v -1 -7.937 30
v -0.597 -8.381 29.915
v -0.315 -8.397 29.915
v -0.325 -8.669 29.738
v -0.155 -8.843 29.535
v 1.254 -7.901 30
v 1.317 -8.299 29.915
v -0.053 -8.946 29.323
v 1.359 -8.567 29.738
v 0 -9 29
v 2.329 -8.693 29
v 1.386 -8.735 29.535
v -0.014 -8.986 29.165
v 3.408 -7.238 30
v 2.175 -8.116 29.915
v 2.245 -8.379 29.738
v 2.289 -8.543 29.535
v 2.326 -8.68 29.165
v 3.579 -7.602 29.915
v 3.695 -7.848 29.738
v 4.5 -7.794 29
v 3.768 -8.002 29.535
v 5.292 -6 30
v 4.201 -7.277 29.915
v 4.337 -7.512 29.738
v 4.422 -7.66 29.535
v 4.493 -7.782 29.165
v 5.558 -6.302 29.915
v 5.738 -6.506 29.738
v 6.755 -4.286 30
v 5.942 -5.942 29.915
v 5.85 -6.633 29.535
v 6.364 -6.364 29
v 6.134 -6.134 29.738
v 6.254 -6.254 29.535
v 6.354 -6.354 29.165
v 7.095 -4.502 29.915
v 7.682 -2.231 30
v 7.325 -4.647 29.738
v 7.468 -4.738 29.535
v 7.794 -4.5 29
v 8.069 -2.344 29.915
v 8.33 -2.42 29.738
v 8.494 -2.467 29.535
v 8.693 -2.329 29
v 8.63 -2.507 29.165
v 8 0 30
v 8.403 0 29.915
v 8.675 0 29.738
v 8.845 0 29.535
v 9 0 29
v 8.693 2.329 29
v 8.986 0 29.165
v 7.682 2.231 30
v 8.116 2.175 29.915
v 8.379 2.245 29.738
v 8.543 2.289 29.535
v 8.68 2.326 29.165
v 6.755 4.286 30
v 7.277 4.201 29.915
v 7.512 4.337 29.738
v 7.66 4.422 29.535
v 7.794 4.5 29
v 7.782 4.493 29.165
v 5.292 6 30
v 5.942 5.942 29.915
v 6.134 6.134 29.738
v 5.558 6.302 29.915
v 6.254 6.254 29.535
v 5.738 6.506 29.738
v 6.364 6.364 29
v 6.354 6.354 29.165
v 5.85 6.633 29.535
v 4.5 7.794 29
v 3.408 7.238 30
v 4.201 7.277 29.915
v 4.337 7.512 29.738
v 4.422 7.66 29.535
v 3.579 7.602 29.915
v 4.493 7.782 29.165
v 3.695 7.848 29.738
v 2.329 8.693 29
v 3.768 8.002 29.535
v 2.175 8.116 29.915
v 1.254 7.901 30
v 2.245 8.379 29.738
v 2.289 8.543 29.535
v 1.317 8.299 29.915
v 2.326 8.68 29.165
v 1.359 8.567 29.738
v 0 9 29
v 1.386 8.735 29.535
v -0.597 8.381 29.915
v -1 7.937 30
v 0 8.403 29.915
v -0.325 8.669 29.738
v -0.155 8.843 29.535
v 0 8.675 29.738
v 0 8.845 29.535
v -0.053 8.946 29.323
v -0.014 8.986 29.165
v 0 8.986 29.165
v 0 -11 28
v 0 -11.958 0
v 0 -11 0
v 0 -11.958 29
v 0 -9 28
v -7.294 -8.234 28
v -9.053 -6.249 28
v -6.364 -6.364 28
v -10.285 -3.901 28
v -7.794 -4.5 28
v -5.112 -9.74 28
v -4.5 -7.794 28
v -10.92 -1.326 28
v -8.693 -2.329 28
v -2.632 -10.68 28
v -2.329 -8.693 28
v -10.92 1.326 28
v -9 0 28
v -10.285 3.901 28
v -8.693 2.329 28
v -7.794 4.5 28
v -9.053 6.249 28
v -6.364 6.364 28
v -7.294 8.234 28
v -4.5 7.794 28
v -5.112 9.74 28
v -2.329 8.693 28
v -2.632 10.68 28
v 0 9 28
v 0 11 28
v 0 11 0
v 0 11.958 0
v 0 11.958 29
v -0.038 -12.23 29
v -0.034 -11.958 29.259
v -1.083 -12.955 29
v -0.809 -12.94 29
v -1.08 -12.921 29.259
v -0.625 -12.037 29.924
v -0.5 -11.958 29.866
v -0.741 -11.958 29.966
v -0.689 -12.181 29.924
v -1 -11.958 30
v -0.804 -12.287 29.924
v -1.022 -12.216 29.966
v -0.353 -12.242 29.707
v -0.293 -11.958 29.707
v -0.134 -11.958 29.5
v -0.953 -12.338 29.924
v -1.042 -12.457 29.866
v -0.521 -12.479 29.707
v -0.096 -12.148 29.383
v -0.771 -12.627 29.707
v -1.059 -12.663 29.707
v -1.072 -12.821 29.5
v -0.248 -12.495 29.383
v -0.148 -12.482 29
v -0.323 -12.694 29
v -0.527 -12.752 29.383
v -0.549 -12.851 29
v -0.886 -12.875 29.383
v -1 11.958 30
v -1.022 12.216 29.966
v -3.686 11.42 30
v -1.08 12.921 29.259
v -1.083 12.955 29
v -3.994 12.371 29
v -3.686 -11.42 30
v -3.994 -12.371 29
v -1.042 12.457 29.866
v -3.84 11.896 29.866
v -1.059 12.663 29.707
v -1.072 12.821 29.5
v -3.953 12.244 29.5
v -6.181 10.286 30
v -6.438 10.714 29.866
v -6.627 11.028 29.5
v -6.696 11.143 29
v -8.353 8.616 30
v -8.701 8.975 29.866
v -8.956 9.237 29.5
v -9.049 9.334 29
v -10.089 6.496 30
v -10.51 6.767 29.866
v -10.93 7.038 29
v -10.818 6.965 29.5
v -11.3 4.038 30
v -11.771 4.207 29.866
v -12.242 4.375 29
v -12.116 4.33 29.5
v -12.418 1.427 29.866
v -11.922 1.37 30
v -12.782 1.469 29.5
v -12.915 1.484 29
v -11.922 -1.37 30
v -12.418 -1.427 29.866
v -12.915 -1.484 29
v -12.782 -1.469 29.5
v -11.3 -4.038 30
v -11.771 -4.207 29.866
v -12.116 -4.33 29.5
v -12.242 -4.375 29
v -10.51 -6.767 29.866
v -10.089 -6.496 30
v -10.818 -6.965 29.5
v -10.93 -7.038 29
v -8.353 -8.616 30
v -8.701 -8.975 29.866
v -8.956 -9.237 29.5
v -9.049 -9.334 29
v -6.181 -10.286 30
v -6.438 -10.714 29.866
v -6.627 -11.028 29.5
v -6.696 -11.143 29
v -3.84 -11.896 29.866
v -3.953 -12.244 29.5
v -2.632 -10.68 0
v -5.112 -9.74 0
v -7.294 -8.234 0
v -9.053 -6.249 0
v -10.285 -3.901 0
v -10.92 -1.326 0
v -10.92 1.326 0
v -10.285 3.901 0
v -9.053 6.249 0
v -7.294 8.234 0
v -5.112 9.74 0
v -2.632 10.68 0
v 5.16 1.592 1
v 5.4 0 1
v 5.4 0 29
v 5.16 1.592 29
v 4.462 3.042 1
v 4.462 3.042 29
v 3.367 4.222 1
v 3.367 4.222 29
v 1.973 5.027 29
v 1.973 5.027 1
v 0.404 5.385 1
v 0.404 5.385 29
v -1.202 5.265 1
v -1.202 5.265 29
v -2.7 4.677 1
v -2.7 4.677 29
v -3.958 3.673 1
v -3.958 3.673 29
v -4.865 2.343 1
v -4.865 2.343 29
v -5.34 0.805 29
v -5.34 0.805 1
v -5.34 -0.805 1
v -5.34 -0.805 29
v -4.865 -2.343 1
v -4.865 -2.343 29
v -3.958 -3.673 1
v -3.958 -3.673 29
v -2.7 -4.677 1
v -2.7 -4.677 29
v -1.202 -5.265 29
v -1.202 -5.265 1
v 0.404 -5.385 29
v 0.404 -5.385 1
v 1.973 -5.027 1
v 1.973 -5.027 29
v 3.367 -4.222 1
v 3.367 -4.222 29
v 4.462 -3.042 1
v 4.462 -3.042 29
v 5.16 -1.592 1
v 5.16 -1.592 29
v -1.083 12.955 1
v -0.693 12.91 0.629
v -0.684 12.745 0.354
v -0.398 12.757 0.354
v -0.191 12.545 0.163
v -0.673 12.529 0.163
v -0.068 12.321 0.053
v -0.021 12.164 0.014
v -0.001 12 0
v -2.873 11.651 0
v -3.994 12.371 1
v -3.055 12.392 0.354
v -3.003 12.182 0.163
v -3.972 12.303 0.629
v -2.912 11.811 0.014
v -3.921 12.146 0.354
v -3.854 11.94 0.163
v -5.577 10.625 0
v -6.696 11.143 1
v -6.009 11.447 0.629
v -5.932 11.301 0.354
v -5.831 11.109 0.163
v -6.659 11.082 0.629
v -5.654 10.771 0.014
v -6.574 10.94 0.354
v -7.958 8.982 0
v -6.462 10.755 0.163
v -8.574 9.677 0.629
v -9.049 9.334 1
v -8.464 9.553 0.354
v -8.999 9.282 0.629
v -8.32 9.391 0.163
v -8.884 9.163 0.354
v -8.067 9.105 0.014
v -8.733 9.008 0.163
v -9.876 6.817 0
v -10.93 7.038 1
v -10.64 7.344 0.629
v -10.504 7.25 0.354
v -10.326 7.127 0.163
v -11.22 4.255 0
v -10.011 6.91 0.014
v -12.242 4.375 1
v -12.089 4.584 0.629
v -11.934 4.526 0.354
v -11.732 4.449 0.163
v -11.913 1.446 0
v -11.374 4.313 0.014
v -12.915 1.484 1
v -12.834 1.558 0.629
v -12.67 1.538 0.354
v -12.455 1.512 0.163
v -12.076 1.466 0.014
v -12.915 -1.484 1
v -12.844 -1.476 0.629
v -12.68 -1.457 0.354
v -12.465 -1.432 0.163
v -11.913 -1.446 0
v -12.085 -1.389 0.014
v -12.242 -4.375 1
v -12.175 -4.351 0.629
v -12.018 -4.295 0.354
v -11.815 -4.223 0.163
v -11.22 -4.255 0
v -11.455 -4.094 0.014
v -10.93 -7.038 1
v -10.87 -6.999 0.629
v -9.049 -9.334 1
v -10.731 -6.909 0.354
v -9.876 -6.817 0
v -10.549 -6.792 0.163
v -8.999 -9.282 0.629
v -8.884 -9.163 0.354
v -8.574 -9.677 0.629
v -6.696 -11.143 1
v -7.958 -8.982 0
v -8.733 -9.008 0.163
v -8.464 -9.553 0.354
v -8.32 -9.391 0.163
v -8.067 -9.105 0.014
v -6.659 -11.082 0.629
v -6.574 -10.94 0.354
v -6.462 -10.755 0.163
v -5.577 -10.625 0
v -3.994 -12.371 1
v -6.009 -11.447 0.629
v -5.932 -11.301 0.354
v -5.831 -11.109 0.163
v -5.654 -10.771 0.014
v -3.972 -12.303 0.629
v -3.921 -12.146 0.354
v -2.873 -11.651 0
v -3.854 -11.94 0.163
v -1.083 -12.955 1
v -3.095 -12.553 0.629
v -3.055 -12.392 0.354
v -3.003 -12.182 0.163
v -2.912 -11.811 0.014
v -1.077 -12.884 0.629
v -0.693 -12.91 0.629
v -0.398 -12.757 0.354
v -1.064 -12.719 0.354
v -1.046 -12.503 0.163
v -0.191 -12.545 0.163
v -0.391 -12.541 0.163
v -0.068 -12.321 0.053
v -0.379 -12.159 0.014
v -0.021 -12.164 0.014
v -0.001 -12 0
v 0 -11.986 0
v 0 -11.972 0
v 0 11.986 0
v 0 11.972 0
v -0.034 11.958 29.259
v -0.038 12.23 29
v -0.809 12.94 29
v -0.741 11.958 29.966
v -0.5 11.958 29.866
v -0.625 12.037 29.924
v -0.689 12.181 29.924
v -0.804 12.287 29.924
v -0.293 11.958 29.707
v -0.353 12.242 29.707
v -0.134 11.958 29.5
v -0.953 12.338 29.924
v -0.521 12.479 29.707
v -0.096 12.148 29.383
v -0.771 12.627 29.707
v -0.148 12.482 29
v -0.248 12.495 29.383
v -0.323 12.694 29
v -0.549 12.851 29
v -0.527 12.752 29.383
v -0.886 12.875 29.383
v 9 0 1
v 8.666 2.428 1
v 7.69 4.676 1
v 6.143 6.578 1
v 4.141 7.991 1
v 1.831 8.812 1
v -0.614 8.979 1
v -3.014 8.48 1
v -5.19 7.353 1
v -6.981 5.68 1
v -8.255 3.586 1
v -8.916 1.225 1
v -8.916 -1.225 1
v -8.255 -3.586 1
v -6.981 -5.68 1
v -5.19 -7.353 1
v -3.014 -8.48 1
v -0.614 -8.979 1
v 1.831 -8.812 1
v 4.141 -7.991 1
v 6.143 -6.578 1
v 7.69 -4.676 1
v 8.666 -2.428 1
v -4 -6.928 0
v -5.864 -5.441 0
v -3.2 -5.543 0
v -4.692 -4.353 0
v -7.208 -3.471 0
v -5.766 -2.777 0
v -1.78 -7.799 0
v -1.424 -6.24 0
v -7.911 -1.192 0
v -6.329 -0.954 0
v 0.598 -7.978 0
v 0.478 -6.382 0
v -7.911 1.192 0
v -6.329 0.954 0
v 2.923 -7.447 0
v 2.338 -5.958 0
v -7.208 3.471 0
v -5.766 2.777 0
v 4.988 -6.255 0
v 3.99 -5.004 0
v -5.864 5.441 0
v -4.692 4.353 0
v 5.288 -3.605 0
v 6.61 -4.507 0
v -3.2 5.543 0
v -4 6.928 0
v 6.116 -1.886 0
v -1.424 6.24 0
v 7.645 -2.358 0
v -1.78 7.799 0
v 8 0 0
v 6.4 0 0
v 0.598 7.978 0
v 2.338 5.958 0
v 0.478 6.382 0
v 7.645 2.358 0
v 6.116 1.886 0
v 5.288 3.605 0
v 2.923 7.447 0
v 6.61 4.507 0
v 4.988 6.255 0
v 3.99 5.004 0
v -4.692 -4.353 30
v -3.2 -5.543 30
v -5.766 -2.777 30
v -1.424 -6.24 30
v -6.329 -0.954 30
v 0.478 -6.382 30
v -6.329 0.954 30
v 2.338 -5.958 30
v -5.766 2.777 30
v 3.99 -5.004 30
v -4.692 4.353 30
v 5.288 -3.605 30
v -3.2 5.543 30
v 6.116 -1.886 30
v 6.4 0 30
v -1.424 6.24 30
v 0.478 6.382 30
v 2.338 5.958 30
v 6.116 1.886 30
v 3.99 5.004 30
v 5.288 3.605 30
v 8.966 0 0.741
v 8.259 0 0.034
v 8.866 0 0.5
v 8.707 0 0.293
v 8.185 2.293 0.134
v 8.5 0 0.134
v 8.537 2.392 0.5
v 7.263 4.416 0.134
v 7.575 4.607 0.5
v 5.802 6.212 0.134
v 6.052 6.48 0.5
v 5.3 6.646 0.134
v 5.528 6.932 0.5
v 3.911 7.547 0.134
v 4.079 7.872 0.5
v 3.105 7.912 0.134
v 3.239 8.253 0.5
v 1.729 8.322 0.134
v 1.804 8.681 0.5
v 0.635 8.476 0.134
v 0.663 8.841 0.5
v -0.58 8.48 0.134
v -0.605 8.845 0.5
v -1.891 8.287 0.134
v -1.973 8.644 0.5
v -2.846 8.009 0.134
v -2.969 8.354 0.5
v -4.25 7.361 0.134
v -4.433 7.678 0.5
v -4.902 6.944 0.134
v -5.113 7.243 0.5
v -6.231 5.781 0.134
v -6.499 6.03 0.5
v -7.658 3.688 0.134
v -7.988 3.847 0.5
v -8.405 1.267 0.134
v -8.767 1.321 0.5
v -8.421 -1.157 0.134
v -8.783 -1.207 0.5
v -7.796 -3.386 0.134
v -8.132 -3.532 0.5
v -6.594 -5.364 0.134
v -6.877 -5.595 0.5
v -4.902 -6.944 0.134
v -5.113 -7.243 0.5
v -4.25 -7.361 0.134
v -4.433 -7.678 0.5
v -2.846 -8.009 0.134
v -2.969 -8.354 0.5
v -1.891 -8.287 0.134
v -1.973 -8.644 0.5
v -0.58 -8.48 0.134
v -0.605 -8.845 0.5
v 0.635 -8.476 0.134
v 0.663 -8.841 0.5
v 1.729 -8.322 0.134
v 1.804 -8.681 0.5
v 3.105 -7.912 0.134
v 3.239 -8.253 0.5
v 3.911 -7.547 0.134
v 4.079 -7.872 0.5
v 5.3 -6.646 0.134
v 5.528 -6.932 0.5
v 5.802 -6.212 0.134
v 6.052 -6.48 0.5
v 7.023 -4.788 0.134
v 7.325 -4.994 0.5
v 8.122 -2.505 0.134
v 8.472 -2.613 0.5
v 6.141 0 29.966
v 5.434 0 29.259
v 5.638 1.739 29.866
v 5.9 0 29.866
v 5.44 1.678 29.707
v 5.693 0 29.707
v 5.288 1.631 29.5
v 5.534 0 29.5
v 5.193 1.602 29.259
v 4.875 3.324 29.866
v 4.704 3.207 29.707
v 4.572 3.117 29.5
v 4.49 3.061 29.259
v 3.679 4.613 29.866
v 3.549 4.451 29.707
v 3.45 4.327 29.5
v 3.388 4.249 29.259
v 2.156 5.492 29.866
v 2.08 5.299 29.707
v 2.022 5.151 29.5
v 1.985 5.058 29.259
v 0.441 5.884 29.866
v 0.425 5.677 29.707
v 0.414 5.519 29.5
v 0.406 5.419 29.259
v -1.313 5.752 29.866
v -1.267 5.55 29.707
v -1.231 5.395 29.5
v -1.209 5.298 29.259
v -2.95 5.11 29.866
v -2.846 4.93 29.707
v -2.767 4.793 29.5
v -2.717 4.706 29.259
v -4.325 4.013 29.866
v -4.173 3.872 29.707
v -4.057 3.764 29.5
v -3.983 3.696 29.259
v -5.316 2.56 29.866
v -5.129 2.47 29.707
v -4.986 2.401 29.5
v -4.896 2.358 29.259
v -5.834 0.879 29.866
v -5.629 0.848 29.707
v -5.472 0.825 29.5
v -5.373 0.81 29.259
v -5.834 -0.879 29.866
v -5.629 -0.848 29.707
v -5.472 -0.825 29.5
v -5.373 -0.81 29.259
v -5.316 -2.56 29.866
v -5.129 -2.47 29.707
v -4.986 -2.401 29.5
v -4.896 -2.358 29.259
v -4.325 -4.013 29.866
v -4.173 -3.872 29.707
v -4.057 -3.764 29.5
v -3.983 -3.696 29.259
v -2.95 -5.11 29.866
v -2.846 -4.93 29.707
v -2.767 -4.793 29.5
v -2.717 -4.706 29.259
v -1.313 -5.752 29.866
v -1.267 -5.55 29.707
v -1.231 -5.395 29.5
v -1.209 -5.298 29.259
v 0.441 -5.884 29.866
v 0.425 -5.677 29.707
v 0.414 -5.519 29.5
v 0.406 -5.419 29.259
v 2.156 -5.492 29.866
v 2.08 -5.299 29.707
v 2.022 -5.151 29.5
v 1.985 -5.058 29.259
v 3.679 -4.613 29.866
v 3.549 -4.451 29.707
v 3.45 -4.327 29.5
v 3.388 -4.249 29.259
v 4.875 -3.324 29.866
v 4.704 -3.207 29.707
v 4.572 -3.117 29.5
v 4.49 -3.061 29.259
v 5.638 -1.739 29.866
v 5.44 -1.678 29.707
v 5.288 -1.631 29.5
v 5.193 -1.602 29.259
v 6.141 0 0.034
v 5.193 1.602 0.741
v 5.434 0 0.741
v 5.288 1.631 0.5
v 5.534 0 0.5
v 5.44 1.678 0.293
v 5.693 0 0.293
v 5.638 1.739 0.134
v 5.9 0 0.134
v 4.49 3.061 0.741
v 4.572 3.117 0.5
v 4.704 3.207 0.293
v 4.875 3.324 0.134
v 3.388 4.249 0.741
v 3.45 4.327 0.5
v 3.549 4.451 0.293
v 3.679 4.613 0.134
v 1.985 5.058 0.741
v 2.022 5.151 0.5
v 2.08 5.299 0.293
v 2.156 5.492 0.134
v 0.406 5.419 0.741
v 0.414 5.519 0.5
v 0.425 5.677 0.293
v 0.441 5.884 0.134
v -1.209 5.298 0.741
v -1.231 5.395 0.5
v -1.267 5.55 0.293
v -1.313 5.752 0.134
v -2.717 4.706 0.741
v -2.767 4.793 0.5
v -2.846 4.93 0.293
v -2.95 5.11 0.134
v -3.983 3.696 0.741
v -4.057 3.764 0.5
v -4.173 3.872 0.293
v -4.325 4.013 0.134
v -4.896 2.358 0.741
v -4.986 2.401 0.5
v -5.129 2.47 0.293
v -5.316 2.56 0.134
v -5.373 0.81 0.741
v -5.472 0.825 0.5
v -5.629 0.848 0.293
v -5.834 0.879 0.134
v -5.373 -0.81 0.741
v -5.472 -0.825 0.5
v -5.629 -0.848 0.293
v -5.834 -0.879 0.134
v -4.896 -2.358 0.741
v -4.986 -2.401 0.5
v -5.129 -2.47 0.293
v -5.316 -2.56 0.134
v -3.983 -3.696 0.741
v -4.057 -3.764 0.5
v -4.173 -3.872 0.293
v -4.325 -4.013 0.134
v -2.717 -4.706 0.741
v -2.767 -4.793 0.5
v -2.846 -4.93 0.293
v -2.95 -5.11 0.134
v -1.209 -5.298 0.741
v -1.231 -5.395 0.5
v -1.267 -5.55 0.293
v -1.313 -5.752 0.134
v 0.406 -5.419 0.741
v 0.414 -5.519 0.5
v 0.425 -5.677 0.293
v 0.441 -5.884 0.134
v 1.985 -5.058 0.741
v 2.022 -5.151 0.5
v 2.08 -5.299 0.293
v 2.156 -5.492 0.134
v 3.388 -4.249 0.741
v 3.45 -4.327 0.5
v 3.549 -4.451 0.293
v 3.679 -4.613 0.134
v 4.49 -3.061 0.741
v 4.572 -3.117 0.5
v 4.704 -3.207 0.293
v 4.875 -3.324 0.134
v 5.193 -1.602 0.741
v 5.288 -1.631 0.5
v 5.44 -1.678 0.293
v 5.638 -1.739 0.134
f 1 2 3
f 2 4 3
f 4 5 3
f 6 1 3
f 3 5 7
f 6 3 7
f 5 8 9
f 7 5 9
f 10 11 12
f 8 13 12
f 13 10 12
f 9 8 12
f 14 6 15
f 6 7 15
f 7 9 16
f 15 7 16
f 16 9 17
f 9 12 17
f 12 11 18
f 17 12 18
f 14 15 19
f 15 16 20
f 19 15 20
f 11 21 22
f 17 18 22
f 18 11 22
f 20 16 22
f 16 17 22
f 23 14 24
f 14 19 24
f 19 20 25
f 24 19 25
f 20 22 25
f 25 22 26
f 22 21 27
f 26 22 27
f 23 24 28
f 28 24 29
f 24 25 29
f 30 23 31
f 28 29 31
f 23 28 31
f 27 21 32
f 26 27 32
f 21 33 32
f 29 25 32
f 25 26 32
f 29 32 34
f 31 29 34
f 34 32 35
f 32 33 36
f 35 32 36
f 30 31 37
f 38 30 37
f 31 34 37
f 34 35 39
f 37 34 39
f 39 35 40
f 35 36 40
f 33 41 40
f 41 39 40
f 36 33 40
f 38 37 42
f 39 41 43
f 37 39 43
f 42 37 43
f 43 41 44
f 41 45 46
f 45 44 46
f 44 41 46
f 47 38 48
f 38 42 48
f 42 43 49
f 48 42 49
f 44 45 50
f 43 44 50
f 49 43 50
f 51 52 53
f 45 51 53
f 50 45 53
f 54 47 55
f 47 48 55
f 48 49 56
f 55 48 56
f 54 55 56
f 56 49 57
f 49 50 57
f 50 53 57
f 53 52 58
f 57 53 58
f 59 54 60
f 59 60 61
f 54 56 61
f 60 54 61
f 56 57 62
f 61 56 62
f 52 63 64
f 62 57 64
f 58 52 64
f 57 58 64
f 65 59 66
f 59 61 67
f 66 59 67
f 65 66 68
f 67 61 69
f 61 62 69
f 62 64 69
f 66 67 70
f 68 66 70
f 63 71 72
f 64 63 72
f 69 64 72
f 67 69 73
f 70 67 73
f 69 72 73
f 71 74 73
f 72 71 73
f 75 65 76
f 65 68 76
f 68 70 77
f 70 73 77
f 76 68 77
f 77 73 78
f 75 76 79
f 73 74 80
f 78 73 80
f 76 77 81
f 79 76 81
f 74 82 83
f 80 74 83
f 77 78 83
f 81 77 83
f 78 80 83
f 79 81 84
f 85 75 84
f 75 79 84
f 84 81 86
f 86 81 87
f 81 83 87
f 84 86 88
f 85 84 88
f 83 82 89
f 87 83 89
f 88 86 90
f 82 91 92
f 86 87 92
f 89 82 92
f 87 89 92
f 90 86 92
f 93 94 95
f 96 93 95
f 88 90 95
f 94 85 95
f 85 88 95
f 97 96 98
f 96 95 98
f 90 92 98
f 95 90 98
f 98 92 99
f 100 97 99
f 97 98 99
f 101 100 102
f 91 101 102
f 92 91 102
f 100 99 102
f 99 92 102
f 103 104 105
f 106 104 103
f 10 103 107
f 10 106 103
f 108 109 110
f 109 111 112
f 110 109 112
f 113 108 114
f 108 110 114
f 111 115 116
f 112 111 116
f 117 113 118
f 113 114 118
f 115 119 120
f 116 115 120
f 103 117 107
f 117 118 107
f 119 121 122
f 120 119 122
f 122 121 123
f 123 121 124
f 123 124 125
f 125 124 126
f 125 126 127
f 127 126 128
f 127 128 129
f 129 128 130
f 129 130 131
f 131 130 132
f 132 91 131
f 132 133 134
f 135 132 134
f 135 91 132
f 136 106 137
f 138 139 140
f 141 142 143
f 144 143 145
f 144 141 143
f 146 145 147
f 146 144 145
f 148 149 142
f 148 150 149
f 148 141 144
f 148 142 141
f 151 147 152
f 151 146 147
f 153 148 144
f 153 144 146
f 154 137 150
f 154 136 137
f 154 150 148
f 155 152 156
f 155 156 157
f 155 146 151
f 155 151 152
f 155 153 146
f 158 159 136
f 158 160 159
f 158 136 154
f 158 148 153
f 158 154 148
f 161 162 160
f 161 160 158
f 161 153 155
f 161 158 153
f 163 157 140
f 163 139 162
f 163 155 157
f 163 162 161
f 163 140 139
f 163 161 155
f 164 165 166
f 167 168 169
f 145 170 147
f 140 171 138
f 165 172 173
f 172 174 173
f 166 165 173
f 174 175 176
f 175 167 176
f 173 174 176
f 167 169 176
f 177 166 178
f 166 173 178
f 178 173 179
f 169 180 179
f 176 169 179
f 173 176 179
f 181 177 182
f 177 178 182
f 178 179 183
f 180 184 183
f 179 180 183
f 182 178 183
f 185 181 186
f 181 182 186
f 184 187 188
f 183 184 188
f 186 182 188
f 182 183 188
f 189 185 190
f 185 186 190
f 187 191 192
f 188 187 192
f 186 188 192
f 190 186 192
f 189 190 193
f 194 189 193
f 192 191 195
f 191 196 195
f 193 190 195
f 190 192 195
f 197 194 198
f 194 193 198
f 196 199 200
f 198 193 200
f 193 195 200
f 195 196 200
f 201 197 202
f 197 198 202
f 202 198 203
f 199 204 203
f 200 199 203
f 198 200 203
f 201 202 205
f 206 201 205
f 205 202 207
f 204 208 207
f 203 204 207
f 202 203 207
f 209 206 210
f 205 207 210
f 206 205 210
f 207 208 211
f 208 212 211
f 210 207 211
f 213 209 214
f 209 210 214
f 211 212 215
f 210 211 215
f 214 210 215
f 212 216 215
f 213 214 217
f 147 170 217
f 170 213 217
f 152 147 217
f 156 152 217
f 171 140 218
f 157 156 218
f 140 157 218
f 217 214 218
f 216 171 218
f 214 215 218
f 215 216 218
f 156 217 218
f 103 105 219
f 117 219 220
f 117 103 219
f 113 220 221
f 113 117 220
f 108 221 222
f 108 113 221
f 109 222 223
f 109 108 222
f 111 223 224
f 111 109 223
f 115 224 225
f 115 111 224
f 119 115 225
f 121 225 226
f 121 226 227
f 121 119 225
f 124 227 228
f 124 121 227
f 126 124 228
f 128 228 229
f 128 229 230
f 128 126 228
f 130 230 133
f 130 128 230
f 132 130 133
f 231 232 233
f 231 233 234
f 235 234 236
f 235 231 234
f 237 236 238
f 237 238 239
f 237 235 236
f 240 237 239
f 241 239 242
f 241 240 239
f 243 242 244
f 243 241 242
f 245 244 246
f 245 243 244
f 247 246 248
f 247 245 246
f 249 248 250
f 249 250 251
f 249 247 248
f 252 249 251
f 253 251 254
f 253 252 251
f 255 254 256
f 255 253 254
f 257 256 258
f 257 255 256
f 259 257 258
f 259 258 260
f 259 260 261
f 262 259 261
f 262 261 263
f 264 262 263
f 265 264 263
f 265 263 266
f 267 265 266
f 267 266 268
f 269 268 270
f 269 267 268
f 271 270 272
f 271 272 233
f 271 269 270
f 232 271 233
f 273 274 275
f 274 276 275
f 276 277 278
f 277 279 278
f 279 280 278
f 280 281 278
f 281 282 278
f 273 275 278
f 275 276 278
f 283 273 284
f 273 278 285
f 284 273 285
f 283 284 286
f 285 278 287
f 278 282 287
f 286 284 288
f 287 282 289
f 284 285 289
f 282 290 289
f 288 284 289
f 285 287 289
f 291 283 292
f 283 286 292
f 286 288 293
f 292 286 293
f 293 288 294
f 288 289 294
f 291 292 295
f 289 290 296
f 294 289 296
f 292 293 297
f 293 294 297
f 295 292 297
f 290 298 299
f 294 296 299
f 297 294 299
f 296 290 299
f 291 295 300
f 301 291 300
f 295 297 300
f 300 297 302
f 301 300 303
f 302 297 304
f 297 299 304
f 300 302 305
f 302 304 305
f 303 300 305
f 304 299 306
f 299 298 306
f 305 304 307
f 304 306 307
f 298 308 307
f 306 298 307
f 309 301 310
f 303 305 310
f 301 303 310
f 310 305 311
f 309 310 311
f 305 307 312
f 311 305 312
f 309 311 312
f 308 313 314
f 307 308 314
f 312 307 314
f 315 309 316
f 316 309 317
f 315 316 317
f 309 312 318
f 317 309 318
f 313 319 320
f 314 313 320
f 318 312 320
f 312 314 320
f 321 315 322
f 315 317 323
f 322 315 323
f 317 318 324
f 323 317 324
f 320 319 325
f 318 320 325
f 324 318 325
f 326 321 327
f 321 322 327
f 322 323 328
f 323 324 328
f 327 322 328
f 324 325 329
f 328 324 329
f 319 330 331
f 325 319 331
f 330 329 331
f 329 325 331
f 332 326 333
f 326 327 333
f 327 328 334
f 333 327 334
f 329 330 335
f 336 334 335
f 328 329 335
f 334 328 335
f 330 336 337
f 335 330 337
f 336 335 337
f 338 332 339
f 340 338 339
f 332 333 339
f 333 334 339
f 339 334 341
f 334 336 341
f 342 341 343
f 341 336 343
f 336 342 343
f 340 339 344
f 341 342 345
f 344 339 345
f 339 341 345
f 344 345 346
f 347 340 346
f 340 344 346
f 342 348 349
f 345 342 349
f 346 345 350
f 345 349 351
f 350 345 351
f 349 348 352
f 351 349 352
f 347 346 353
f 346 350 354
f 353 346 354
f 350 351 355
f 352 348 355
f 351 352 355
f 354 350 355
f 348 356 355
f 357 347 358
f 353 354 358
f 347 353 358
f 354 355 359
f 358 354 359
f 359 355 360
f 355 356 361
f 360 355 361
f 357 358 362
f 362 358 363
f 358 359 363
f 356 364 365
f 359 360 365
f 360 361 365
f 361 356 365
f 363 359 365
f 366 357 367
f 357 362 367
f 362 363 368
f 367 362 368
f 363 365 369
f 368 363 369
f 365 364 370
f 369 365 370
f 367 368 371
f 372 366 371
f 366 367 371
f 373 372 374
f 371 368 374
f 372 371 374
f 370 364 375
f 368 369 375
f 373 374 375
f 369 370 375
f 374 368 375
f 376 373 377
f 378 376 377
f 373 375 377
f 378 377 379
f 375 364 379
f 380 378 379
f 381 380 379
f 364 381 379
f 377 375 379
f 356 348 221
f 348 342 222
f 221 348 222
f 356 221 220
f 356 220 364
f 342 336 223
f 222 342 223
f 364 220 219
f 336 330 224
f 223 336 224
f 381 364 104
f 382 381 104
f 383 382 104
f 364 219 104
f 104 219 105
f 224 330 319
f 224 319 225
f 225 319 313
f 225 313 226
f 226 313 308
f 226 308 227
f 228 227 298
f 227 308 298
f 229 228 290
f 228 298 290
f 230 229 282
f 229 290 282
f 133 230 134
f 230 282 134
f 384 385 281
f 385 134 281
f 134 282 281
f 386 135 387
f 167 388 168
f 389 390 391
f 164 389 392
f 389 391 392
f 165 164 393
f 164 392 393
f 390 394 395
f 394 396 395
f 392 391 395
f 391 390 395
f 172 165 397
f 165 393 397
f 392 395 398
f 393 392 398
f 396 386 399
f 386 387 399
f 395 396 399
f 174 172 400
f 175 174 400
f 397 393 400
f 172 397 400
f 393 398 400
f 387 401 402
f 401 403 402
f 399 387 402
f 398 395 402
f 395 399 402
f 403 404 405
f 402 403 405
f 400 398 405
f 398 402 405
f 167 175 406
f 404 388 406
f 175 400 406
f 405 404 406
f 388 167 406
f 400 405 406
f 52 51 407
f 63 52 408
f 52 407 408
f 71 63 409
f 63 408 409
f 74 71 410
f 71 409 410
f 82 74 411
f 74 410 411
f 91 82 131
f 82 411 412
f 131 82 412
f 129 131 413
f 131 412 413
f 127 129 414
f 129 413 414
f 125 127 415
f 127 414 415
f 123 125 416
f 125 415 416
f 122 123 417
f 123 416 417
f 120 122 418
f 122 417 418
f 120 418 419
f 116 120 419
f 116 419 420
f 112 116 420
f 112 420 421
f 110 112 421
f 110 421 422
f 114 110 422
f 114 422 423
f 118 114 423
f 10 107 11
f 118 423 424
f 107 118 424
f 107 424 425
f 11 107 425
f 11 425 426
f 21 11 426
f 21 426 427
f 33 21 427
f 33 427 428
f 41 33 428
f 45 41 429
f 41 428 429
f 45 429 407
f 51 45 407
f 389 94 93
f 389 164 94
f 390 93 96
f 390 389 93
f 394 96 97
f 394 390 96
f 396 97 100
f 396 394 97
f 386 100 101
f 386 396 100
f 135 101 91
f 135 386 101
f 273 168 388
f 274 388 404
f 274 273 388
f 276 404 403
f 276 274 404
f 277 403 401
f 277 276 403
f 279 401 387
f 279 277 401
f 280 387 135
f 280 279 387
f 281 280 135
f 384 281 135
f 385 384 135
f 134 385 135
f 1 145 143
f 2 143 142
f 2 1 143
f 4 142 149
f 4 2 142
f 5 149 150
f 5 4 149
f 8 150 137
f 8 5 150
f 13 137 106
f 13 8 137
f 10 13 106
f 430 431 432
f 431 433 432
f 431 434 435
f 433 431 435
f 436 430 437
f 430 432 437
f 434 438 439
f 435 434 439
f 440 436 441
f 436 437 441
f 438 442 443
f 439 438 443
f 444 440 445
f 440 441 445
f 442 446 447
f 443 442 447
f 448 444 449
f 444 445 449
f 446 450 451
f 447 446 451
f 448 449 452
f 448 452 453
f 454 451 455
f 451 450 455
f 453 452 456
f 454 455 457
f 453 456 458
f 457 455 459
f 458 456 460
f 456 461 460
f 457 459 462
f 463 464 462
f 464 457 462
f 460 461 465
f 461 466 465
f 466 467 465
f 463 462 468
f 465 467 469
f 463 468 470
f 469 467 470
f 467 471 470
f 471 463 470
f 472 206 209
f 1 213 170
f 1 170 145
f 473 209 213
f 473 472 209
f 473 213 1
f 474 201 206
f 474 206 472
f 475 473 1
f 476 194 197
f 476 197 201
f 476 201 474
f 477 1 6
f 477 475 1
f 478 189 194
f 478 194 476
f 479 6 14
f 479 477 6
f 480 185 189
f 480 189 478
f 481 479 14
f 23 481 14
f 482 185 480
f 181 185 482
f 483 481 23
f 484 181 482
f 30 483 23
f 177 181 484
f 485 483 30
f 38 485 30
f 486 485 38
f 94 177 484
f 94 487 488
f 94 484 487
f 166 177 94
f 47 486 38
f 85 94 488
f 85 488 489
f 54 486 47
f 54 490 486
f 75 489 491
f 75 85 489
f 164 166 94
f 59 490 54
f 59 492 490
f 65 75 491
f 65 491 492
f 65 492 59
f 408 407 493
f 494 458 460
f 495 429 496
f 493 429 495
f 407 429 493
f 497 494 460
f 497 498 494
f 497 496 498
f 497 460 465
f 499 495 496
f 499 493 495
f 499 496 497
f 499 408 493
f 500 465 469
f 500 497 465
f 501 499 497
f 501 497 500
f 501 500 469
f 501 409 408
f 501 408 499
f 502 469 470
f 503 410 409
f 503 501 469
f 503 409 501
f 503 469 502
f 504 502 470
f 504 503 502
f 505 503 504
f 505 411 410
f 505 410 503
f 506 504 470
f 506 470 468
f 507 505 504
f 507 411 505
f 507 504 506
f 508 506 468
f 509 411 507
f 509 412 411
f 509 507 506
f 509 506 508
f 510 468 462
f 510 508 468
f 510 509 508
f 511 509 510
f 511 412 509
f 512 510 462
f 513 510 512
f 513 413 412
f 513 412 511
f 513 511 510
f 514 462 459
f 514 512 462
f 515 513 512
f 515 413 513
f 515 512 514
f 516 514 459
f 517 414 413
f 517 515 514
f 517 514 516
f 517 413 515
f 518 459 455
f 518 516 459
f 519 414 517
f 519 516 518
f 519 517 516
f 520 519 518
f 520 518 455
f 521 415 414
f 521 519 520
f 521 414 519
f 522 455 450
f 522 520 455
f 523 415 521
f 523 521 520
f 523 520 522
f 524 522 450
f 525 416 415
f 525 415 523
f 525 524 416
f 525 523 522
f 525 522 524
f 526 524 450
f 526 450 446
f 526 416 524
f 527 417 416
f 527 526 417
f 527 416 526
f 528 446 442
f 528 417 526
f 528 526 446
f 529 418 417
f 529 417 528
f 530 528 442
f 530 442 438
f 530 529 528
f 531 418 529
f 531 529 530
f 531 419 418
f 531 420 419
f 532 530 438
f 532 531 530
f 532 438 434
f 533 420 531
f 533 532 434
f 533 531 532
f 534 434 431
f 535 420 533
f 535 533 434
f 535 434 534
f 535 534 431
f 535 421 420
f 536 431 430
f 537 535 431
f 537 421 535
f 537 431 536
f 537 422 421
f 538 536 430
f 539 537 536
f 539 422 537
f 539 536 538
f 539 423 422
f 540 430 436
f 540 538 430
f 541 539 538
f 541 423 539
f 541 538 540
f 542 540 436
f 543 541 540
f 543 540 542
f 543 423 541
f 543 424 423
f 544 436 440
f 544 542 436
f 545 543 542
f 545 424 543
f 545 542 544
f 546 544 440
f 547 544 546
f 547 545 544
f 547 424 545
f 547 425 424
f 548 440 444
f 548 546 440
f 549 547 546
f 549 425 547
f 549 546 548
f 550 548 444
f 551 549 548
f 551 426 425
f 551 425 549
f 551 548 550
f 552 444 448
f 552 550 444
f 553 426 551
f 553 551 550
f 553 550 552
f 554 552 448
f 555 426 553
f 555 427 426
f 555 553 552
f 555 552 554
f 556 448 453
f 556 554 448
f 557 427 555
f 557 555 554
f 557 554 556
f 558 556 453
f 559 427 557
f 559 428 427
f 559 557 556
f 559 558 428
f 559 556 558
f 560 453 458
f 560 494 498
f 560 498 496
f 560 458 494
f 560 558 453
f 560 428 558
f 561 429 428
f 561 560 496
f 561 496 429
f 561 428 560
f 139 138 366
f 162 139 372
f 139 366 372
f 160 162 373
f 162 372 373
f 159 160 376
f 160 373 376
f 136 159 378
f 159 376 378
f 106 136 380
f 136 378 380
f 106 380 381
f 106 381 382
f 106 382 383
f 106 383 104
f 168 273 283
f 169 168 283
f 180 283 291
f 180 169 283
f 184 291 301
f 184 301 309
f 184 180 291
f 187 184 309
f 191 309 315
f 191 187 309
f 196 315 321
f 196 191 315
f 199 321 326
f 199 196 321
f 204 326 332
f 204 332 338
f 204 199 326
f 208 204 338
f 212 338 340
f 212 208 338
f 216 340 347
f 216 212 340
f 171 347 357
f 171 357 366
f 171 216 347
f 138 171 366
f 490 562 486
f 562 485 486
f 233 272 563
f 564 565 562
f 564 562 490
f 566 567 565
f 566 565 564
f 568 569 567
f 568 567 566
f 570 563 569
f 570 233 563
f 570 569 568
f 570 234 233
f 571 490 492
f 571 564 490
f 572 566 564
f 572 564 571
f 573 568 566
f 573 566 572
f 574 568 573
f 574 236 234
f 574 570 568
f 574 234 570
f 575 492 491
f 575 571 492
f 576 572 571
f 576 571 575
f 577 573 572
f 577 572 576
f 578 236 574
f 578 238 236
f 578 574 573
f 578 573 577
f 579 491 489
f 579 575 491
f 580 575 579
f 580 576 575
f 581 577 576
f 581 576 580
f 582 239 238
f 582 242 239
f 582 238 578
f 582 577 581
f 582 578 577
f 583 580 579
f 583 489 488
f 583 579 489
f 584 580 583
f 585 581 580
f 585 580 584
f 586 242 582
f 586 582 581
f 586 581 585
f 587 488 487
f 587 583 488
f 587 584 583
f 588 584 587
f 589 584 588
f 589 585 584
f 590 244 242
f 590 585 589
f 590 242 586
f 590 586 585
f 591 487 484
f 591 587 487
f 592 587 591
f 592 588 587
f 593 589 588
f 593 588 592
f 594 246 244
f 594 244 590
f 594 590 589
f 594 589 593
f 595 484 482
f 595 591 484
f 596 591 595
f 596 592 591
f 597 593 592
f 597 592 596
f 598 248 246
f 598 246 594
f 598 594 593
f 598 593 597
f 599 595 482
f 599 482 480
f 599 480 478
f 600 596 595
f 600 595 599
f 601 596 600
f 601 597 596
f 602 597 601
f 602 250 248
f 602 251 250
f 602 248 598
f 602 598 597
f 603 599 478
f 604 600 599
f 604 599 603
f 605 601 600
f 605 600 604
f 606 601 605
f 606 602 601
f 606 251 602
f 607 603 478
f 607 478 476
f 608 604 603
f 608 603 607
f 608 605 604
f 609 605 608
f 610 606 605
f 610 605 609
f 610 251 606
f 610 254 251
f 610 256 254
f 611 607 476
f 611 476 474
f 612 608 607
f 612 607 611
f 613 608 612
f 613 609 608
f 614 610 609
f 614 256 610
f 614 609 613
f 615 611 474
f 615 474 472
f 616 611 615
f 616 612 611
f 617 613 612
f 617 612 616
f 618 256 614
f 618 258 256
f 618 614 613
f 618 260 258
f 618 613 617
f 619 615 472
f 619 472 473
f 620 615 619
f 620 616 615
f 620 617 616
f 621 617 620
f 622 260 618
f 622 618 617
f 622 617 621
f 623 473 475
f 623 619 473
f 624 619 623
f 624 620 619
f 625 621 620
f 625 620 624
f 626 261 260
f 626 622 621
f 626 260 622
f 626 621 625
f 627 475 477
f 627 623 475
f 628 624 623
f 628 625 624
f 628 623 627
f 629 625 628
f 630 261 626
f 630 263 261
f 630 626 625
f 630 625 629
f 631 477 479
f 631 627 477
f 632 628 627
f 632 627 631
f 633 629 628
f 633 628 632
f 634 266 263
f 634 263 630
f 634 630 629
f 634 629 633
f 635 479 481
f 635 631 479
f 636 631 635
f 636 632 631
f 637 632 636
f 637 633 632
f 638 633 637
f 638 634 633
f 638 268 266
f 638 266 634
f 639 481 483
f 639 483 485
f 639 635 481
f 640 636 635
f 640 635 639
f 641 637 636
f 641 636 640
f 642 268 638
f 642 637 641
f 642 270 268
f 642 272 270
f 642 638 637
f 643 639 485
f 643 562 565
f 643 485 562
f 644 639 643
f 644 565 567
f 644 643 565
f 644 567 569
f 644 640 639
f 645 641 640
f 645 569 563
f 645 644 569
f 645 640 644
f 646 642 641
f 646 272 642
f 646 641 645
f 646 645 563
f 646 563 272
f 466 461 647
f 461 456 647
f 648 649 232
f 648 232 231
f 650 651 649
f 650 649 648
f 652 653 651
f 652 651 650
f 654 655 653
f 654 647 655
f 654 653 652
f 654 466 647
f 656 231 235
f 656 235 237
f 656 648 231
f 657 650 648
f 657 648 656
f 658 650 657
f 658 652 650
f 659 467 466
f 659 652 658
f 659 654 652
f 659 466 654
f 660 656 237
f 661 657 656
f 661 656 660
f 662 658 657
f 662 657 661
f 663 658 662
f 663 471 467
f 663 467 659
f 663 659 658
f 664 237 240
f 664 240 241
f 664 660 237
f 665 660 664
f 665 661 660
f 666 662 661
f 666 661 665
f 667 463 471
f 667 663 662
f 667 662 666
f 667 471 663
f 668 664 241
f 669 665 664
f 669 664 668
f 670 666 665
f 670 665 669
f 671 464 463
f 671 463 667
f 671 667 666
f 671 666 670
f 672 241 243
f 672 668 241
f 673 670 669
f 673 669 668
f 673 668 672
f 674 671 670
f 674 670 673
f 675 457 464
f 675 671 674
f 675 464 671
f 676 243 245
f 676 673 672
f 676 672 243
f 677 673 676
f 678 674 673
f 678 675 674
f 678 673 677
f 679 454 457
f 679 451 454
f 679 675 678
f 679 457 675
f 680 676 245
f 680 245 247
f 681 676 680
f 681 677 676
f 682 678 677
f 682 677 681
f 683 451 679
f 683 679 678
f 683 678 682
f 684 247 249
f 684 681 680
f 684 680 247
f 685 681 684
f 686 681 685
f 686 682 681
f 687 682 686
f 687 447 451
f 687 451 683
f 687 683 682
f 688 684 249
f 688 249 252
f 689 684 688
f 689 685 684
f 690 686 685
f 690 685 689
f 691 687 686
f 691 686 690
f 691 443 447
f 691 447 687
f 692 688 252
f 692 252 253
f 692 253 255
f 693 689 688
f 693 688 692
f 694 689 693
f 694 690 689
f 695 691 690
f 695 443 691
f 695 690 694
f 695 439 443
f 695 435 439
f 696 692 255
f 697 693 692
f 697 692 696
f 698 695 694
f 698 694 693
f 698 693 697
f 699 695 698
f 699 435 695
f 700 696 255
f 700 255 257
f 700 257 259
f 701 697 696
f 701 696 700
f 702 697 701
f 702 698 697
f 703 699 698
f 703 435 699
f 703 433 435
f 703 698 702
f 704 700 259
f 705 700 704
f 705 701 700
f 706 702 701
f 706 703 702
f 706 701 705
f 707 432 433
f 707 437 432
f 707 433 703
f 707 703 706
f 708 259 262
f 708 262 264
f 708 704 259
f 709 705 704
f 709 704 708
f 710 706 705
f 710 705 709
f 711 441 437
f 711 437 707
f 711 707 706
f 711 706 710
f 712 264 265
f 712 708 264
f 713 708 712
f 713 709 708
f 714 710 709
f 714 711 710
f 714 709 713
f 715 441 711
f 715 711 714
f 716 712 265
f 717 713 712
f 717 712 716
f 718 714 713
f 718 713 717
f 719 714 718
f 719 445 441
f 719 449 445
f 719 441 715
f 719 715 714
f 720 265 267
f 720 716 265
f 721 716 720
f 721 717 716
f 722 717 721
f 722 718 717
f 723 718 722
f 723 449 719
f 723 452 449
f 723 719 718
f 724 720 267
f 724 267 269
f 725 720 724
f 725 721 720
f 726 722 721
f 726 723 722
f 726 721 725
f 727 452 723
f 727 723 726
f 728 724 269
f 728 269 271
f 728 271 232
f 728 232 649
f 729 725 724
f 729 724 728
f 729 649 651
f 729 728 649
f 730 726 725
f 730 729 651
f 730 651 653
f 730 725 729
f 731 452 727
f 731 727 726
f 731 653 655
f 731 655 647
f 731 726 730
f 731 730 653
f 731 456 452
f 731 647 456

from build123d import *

# Parameters (mm, degrees)
F0_R     = 9
F0_R_2   = 5.4
F1_DEPTH = 30
F3_DEPTH = 2
F4_DEPTH = 30
F5_R     = 1


with BuildPart() as f1:
    # F0 (on Top) → F1 (new body)
    with BuildSketch(Plane.XY):
        Circle(F0_R)
        Circle(F0_R_2, mode=Mode.SUBTRACT)
    extrude(amount=F1_DEPTH)

    # F2 (on face) → F3 (join)
    with BuildSketch(Plane.XY.offset(30)):
        with BuildLine():
            Line((0, 11), (0, 13))
            ThreePointArc((0, 13), (-13, 0), (0, -13))
            Line((0, -13), (0, -11))
            ThreePointArc((0, -11), (-11, 0), (0, 11))
        make_face()
        with BuildLine():
            Line((0, 9), (0, 11))
            ThreePointArc((0, 11), (-11, 0), (0, -11))
            Line((0, -11), (0, -9))
            ThreePointArc((0, -9), (-9, 0), (0, 9))
        make_face()
    extrude(amount=-F3_DEPTH)

    # F2 (on face) → F4 (join)
    with BuildSketch(Plane.XY.offset(30)):
        with BuildLine():
            Line((0, 11), (0, 13))
            ThreePointArc((0, 13), (-13, 0), (0, -13))
            Line((0, -13), (0, -11))
            ThreePointArc((0, -11), (-11, 0), (0, 11))
        make_face()
    extrude(amount=-F4_DEPTH)

    # F5
    f5_edges = [f1.edges().sort_by_distance(p)[0] for p in [
        (-9, 0, 0),
        (-13, 0, 0),
        (-13, 0, 30),
        (0, 13, 15),
        (0, -13, 15),
        (0, -11, 30),
        (0, 11, 30),
        (6.363961, -6.363961, 30),
        (6.363961, 6.363961, 30),
        (-5.4, 0, 30),
        (-5.4, 0, 0),
    ]]
    fillet(f5_edges, radius=F5_R)


solid = f1.part
